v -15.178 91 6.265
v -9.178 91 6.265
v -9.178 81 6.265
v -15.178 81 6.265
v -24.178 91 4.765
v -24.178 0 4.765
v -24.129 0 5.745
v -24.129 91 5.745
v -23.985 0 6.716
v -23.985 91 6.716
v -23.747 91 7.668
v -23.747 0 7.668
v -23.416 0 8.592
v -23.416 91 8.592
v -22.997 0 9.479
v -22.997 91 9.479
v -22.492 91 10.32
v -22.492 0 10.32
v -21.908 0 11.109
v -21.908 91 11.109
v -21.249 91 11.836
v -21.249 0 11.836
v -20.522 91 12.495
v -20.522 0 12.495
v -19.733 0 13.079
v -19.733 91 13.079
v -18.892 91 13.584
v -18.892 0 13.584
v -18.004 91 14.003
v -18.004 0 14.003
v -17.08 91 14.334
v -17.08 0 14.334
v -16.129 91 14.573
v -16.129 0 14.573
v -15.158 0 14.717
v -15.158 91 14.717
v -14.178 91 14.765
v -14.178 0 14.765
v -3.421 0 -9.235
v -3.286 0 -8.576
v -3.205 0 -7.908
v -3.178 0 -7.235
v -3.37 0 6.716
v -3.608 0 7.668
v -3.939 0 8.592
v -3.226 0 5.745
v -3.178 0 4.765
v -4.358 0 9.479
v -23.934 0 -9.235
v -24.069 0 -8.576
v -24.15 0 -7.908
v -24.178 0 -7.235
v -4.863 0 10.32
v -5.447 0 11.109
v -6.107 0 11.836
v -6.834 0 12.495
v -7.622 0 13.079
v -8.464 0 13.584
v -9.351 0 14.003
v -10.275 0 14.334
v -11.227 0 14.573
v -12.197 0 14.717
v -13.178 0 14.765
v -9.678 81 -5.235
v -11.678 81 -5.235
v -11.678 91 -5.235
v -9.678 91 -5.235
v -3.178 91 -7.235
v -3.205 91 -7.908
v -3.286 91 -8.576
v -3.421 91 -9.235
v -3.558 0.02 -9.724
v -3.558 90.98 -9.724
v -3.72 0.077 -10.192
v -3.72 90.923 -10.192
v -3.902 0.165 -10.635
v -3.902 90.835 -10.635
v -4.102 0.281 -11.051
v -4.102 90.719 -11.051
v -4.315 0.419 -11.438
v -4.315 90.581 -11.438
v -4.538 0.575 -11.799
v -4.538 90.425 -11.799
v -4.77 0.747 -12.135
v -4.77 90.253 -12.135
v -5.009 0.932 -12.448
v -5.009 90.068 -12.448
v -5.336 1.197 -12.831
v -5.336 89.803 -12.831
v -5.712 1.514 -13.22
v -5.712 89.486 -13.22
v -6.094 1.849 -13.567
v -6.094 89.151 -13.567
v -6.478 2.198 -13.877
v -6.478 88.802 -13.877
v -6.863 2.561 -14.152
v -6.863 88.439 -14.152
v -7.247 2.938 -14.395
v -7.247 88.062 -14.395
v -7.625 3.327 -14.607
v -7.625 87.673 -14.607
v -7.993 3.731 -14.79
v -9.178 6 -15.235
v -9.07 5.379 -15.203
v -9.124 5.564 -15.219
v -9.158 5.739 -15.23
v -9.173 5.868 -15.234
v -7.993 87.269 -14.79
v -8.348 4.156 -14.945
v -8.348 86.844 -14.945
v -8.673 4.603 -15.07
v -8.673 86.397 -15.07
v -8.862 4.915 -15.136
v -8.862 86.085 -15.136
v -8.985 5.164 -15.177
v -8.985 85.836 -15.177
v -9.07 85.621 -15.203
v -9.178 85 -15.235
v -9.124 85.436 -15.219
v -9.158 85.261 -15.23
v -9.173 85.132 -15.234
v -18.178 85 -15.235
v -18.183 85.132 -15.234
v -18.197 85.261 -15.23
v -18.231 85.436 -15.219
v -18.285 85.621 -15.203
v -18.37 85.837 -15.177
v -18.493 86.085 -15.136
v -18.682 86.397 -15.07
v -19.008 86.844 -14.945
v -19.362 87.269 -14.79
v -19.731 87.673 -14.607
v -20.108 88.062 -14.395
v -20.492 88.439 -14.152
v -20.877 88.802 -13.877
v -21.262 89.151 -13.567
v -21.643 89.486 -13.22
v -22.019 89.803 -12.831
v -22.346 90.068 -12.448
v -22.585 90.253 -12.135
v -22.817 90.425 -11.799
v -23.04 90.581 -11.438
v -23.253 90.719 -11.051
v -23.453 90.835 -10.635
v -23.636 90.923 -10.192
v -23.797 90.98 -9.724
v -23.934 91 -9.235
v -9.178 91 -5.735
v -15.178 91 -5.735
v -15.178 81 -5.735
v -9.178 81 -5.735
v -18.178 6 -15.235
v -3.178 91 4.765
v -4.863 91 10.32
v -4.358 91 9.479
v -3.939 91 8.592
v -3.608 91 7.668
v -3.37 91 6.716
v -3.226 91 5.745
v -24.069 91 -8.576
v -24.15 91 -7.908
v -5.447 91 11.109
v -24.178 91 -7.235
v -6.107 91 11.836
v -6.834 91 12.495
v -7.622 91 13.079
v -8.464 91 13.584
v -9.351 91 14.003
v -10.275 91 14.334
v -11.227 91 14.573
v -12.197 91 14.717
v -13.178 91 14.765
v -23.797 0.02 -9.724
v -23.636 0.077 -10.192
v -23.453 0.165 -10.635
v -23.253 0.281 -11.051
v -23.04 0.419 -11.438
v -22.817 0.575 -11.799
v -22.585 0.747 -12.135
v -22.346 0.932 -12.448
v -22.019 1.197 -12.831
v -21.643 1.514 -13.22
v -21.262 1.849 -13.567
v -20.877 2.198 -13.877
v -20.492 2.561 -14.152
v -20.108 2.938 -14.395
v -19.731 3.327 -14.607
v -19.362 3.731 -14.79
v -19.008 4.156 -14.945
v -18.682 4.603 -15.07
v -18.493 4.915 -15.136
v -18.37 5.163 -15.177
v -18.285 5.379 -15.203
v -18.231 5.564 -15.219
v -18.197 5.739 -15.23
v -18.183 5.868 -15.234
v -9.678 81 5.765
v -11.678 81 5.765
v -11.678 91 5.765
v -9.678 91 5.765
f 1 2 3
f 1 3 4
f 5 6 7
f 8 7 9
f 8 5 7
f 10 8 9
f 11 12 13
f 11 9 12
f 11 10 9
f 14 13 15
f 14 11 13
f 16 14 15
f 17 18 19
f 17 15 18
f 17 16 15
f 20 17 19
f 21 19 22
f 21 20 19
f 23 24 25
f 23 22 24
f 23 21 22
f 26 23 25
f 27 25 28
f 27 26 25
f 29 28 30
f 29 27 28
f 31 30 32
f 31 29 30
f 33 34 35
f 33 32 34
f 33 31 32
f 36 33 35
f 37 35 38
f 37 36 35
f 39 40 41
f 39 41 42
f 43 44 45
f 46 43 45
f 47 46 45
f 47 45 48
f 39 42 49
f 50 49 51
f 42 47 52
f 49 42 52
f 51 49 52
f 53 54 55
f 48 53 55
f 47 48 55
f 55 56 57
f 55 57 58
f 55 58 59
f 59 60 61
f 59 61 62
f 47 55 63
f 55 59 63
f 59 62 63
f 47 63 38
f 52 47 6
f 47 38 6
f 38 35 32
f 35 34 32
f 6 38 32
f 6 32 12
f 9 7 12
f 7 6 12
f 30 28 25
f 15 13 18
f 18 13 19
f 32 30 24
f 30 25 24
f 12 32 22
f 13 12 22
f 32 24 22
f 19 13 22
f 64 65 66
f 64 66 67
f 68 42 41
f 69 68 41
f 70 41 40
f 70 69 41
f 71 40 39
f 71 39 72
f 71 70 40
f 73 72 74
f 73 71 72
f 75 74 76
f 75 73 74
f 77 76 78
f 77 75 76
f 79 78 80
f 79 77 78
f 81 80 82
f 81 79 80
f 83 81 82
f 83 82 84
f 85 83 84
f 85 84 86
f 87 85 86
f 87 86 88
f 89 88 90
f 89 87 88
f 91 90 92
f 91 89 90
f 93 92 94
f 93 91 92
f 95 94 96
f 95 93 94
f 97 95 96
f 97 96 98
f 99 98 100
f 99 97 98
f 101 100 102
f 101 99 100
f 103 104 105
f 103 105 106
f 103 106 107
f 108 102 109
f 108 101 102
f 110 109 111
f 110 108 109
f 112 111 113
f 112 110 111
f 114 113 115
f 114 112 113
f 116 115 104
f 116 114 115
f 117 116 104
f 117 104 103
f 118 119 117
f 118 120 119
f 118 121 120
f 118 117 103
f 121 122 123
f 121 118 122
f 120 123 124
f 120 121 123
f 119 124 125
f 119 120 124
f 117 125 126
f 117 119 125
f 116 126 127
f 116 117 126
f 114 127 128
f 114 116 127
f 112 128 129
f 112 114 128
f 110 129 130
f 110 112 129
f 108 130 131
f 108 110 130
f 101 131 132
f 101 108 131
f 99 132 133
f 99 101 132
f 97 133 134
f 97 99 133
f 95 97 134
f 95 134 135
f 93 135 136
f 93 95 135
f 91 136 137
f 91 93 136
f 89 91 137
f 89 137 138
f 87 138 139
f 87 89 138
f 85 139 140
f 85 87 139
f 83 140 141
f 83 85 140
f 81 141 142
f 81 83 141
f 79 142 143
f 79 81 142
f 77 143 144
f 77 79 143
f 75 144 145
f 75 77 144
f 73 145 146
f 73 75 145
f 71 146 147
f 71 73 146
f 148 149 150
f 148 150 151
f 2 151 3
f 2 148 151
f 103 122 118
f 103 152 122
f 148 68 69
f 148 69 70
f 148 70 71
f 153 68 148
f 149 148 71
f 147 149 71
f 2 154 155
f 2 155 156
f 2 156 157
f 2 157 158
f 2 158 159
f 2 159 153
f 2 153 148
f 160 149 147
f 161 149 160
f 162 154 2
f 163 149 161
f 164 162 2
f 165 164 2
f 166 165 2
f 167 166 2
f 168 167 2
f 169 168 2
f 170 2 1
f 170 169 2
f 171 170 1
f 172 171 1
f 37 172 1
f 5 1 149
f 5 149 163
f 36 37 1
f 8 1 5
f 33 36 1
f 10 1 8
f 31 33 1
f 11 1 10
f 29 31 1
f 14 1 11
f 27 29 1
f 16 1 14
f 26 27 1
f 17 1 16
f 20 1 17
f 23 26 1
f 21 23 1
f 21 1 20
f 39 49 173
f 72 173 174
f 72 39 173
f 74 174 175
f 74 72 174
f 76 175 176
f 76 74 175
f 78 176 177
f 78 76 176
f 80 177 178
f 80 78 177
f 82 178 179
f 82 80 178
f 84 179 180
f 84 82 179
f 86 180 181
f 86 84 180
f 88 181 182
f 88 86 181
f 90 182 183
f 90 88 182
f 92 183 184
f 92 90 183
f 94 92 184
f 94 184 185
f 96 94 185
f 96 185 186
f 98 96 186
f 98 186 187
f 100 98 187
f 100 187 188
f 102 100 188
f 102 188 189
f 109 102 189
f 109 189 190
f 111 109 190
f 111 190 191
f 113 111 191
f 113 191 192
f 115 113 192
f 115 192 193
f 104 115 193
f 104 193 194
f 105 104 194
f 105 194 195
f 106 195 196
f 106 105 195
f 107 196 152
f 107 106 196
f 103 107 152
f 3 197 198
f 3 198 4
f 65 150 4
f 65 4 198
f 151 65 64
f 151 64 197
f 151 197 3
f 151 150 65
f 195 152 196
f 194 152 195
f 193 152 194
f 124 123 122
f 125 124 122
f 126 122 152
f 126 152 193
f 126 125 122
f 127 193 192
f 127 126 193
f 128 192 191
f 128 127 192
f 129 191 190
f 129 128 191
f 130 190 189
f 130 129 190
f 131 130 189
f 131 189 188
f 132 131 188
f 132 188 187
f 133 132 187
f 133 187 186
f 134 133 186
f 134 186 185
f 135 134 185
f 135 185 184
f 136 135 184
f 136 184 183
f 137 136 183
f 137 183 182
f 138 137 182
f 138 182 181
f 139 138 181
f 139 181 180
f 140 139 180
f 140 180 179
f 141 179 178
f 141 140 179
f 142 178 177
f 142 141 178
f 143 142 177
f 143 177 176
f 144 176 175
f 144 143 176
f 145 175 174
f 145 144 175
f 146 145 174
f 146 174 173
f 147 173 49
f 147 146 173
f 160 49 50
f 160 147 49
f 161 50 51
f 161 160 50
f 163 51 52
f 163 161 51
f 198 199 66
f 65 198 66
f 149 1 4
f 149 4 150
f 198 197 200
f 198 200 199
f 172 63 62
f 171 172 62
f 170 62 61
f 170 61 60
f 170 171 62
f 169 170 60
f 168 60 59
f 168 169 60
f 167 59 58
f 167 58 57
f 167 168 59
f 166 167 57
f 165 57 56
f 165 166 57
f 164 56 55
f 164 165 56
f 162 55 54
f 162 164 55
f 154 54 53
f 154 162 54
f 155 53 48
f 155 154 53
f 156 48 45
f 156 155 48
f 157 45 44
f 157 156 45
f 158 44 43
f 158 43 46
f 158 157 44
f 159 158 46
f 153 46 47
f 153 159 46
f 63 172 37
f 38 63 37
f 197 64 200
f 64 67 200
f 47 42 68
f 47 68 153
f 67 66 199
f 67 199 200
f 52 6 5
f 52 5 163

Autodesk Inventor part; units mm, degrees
ref_plane "YZ Plane" through (0, 0, 0) normal (1, 0, 0) x (0, 1, 0)
ref_plane "XZ Plane" through (0, 0, 0) normal (0, 1, 0) x (-1, 0, 0)
ref_plane "XY Plane" through (0, 0, 0) normal (0, 0, 1) x (1, 0, 0)
sketch "Sketch1" plane through (0, 0, 0) normal (0, 1, 0) x (-1, 0, 0)
  line L0 (3.1776, 14.7647) -> (24.1776, 14.7647)
  line L1 (24.1776, 14.7647) -> (24.1776, -15.2353)
  line L2 (24.1776, -15.2353) -> (3.1776, -15.2353)
  line L3 (3.1776, -15.2353) -> (3.1776, 14.7647)
  dimension "d4" = 30
  dimension "d5" = 21
extrude "Extrusion1" add sketch "Sketch1" along normal blind 91
fillet "Fillet1" radius 10 2 edges at (-3.1776, 45.5, 14.7647) (-24.1776, 45.5, 14.7647)
fillet "Fillet2" radius 6 2 edges at (-13.6776, 91, -15.2353) (-13.6776, 0, -15.2353)
sketch "Sketch2" plane through (0, 91, 0) normal (0, 1, 0) x (1, 0, 0)
  line L0 (-3.1776, 15.2353) -> (-3.1776, 7.2353)
  line L1 (-24.1776, 7.2353) -> (-24.1776, 15.2353)
  line L2 (-9.1776, 15.2353) -> (-3.1776, 15.2353)
  line L3 (-3.1776, 15.2353) -> (-3.1776, 7.2353)
  line L4 (-3.1776, 7.2353) -> (1.8224, 7.2353) construction
  arc A0 (-3.1776, 7.2353) -> (-9.1776, 15.2353) centre (-11.5109, 7.2353) ccw
  line L5 (-24.1776, 15.2353) -> (-18.1776, 15.2353)
  line L6 (-24.1776, 7.2353) -> (-24.1776, 15.2353)
  arc A1 (-18.1776, 15.2353) -> (-24.1776, 7.2353) centre (-15.8442, 7.2353) ccw
  line L7 (-24.1776, 15.2353) -> (-18.1776, 15.2353)
  line L8 (-3.1776, 15.2353) -> (-9.1776, 15.2353)
  point P0 (0, 0)
  dimension "d10" = 21
  dimension "d11" = 8
  dimension "d12" = 6
  dimension "d20" = 8
  dimension "d21" = 6
extrude "Extrusion3" cut sketch "Sketch2" against normal up to next
sketch "Sketch3" plane through (0, 91, 0) normal (0, 1, 0) x (1, 0, 0)
  line L0 (-9.1776, -6.2647) -> (-15.1776, -6.2647)
  line L1 (-15.1776, -6.2647) -> (-15.1776, 5.7353)
  line L2 (-15.1776, 5.7353) -> (-9.1776, 5.7353)
  line L3 (-9.1776, 5.7353) -> (-9.1776, -6.2647)
  line L4 (-3.1776, -4.7647) -> (-3.1776, 7.2353) projected
  line L5 (-14.1776, -14.7647) -> (-13.1776, -14.7647) projected
  point P0 (0, 0)
  dimension "d24" = 6
  dimension "d25" = 12
  dimension "d26" = 6
  dimension "d27" = 8.5
sketch "Sketch4" plane through (0, 91, 0) normal (0, 1, 0) x (1, 0, 0)
  line L0 (-9.6776, -5.7647) -> (-11.6776, -5.7647)
  line L1 (-11.6776, -5.7647) -> (-11.6776, 5.2353)
  line L2 (-11.6776, 5.2353) -> (-9.6776, 5.2353)
  line L3 (-9.6776, 5.2353) -> (-9.6776, -5.7647)
  line L4 (-3.1776, -4.7647) -> (-3.1776, 7.2353) projected
  line L5 (-14.1776, -14.7647) -> (-13.1776, -14.7647) projected
  point P0 (0, 0)
  dimension "d28" = 2
  dimension "d29" = 11
  dimension "d30" = 6.5
  dimension "d31" = 9
extrude "Extrusion4" cut sketch "Sketch3" against normal blind 10
extrude "Extrusion5" add sketch "Sketch4" against normal blind 10
sketch "Sketch5" plane through (0, 91, 0) normal (0, 1, 0) x (1, 0, 0)
  arc A0 (-13.1776, -14.7647) -> (-3.1776, -4.7647) centre (-13.1776, -4.7647) ccw projected
  line L0 (-14.1776, -14.7647) -> (-13.1776, -14.7647) projected
  arc A1 (-24.1776, -4.7647) -> (-14.1776, -14.7647) centre (-14.1776, -4.7647) ccw projected
  line L1 (-24.1776, 7.2353) -> (-24.1776, -4.7647) projected
  arc A2 (-23.934, 9.2353) -> (-24.1776, 7.2353) centre (-15.8442, 7.2353) ccw projected
  line L2 (-9.1776, 15.2353) -> (-18.1776, 15.2353) projected
  arc A3 (-3.1776, 7.2353) -> (-3.4211, 9.2353) centre (-11.5109, 7.2353) ccw projected
  line L3 (-3.1776, -4.7647) -> (-3.1776, 7.2353) projected
  line L4 (-9.1776, -6.2647) -> (-15.1776, -6.2647) projected
  line L5 (-9.1776, 5.7353) -> (-9.1776, -6.2647) projected
  line L6 (-15.1776, 5.7353) -> (-9.1776, 5.7353) projected
  line L7 (-15.1776, -6.2647) -> (-15.1776, 5.7353) projected
  point P0 (0, 0)
properties part number "Powerbank"
